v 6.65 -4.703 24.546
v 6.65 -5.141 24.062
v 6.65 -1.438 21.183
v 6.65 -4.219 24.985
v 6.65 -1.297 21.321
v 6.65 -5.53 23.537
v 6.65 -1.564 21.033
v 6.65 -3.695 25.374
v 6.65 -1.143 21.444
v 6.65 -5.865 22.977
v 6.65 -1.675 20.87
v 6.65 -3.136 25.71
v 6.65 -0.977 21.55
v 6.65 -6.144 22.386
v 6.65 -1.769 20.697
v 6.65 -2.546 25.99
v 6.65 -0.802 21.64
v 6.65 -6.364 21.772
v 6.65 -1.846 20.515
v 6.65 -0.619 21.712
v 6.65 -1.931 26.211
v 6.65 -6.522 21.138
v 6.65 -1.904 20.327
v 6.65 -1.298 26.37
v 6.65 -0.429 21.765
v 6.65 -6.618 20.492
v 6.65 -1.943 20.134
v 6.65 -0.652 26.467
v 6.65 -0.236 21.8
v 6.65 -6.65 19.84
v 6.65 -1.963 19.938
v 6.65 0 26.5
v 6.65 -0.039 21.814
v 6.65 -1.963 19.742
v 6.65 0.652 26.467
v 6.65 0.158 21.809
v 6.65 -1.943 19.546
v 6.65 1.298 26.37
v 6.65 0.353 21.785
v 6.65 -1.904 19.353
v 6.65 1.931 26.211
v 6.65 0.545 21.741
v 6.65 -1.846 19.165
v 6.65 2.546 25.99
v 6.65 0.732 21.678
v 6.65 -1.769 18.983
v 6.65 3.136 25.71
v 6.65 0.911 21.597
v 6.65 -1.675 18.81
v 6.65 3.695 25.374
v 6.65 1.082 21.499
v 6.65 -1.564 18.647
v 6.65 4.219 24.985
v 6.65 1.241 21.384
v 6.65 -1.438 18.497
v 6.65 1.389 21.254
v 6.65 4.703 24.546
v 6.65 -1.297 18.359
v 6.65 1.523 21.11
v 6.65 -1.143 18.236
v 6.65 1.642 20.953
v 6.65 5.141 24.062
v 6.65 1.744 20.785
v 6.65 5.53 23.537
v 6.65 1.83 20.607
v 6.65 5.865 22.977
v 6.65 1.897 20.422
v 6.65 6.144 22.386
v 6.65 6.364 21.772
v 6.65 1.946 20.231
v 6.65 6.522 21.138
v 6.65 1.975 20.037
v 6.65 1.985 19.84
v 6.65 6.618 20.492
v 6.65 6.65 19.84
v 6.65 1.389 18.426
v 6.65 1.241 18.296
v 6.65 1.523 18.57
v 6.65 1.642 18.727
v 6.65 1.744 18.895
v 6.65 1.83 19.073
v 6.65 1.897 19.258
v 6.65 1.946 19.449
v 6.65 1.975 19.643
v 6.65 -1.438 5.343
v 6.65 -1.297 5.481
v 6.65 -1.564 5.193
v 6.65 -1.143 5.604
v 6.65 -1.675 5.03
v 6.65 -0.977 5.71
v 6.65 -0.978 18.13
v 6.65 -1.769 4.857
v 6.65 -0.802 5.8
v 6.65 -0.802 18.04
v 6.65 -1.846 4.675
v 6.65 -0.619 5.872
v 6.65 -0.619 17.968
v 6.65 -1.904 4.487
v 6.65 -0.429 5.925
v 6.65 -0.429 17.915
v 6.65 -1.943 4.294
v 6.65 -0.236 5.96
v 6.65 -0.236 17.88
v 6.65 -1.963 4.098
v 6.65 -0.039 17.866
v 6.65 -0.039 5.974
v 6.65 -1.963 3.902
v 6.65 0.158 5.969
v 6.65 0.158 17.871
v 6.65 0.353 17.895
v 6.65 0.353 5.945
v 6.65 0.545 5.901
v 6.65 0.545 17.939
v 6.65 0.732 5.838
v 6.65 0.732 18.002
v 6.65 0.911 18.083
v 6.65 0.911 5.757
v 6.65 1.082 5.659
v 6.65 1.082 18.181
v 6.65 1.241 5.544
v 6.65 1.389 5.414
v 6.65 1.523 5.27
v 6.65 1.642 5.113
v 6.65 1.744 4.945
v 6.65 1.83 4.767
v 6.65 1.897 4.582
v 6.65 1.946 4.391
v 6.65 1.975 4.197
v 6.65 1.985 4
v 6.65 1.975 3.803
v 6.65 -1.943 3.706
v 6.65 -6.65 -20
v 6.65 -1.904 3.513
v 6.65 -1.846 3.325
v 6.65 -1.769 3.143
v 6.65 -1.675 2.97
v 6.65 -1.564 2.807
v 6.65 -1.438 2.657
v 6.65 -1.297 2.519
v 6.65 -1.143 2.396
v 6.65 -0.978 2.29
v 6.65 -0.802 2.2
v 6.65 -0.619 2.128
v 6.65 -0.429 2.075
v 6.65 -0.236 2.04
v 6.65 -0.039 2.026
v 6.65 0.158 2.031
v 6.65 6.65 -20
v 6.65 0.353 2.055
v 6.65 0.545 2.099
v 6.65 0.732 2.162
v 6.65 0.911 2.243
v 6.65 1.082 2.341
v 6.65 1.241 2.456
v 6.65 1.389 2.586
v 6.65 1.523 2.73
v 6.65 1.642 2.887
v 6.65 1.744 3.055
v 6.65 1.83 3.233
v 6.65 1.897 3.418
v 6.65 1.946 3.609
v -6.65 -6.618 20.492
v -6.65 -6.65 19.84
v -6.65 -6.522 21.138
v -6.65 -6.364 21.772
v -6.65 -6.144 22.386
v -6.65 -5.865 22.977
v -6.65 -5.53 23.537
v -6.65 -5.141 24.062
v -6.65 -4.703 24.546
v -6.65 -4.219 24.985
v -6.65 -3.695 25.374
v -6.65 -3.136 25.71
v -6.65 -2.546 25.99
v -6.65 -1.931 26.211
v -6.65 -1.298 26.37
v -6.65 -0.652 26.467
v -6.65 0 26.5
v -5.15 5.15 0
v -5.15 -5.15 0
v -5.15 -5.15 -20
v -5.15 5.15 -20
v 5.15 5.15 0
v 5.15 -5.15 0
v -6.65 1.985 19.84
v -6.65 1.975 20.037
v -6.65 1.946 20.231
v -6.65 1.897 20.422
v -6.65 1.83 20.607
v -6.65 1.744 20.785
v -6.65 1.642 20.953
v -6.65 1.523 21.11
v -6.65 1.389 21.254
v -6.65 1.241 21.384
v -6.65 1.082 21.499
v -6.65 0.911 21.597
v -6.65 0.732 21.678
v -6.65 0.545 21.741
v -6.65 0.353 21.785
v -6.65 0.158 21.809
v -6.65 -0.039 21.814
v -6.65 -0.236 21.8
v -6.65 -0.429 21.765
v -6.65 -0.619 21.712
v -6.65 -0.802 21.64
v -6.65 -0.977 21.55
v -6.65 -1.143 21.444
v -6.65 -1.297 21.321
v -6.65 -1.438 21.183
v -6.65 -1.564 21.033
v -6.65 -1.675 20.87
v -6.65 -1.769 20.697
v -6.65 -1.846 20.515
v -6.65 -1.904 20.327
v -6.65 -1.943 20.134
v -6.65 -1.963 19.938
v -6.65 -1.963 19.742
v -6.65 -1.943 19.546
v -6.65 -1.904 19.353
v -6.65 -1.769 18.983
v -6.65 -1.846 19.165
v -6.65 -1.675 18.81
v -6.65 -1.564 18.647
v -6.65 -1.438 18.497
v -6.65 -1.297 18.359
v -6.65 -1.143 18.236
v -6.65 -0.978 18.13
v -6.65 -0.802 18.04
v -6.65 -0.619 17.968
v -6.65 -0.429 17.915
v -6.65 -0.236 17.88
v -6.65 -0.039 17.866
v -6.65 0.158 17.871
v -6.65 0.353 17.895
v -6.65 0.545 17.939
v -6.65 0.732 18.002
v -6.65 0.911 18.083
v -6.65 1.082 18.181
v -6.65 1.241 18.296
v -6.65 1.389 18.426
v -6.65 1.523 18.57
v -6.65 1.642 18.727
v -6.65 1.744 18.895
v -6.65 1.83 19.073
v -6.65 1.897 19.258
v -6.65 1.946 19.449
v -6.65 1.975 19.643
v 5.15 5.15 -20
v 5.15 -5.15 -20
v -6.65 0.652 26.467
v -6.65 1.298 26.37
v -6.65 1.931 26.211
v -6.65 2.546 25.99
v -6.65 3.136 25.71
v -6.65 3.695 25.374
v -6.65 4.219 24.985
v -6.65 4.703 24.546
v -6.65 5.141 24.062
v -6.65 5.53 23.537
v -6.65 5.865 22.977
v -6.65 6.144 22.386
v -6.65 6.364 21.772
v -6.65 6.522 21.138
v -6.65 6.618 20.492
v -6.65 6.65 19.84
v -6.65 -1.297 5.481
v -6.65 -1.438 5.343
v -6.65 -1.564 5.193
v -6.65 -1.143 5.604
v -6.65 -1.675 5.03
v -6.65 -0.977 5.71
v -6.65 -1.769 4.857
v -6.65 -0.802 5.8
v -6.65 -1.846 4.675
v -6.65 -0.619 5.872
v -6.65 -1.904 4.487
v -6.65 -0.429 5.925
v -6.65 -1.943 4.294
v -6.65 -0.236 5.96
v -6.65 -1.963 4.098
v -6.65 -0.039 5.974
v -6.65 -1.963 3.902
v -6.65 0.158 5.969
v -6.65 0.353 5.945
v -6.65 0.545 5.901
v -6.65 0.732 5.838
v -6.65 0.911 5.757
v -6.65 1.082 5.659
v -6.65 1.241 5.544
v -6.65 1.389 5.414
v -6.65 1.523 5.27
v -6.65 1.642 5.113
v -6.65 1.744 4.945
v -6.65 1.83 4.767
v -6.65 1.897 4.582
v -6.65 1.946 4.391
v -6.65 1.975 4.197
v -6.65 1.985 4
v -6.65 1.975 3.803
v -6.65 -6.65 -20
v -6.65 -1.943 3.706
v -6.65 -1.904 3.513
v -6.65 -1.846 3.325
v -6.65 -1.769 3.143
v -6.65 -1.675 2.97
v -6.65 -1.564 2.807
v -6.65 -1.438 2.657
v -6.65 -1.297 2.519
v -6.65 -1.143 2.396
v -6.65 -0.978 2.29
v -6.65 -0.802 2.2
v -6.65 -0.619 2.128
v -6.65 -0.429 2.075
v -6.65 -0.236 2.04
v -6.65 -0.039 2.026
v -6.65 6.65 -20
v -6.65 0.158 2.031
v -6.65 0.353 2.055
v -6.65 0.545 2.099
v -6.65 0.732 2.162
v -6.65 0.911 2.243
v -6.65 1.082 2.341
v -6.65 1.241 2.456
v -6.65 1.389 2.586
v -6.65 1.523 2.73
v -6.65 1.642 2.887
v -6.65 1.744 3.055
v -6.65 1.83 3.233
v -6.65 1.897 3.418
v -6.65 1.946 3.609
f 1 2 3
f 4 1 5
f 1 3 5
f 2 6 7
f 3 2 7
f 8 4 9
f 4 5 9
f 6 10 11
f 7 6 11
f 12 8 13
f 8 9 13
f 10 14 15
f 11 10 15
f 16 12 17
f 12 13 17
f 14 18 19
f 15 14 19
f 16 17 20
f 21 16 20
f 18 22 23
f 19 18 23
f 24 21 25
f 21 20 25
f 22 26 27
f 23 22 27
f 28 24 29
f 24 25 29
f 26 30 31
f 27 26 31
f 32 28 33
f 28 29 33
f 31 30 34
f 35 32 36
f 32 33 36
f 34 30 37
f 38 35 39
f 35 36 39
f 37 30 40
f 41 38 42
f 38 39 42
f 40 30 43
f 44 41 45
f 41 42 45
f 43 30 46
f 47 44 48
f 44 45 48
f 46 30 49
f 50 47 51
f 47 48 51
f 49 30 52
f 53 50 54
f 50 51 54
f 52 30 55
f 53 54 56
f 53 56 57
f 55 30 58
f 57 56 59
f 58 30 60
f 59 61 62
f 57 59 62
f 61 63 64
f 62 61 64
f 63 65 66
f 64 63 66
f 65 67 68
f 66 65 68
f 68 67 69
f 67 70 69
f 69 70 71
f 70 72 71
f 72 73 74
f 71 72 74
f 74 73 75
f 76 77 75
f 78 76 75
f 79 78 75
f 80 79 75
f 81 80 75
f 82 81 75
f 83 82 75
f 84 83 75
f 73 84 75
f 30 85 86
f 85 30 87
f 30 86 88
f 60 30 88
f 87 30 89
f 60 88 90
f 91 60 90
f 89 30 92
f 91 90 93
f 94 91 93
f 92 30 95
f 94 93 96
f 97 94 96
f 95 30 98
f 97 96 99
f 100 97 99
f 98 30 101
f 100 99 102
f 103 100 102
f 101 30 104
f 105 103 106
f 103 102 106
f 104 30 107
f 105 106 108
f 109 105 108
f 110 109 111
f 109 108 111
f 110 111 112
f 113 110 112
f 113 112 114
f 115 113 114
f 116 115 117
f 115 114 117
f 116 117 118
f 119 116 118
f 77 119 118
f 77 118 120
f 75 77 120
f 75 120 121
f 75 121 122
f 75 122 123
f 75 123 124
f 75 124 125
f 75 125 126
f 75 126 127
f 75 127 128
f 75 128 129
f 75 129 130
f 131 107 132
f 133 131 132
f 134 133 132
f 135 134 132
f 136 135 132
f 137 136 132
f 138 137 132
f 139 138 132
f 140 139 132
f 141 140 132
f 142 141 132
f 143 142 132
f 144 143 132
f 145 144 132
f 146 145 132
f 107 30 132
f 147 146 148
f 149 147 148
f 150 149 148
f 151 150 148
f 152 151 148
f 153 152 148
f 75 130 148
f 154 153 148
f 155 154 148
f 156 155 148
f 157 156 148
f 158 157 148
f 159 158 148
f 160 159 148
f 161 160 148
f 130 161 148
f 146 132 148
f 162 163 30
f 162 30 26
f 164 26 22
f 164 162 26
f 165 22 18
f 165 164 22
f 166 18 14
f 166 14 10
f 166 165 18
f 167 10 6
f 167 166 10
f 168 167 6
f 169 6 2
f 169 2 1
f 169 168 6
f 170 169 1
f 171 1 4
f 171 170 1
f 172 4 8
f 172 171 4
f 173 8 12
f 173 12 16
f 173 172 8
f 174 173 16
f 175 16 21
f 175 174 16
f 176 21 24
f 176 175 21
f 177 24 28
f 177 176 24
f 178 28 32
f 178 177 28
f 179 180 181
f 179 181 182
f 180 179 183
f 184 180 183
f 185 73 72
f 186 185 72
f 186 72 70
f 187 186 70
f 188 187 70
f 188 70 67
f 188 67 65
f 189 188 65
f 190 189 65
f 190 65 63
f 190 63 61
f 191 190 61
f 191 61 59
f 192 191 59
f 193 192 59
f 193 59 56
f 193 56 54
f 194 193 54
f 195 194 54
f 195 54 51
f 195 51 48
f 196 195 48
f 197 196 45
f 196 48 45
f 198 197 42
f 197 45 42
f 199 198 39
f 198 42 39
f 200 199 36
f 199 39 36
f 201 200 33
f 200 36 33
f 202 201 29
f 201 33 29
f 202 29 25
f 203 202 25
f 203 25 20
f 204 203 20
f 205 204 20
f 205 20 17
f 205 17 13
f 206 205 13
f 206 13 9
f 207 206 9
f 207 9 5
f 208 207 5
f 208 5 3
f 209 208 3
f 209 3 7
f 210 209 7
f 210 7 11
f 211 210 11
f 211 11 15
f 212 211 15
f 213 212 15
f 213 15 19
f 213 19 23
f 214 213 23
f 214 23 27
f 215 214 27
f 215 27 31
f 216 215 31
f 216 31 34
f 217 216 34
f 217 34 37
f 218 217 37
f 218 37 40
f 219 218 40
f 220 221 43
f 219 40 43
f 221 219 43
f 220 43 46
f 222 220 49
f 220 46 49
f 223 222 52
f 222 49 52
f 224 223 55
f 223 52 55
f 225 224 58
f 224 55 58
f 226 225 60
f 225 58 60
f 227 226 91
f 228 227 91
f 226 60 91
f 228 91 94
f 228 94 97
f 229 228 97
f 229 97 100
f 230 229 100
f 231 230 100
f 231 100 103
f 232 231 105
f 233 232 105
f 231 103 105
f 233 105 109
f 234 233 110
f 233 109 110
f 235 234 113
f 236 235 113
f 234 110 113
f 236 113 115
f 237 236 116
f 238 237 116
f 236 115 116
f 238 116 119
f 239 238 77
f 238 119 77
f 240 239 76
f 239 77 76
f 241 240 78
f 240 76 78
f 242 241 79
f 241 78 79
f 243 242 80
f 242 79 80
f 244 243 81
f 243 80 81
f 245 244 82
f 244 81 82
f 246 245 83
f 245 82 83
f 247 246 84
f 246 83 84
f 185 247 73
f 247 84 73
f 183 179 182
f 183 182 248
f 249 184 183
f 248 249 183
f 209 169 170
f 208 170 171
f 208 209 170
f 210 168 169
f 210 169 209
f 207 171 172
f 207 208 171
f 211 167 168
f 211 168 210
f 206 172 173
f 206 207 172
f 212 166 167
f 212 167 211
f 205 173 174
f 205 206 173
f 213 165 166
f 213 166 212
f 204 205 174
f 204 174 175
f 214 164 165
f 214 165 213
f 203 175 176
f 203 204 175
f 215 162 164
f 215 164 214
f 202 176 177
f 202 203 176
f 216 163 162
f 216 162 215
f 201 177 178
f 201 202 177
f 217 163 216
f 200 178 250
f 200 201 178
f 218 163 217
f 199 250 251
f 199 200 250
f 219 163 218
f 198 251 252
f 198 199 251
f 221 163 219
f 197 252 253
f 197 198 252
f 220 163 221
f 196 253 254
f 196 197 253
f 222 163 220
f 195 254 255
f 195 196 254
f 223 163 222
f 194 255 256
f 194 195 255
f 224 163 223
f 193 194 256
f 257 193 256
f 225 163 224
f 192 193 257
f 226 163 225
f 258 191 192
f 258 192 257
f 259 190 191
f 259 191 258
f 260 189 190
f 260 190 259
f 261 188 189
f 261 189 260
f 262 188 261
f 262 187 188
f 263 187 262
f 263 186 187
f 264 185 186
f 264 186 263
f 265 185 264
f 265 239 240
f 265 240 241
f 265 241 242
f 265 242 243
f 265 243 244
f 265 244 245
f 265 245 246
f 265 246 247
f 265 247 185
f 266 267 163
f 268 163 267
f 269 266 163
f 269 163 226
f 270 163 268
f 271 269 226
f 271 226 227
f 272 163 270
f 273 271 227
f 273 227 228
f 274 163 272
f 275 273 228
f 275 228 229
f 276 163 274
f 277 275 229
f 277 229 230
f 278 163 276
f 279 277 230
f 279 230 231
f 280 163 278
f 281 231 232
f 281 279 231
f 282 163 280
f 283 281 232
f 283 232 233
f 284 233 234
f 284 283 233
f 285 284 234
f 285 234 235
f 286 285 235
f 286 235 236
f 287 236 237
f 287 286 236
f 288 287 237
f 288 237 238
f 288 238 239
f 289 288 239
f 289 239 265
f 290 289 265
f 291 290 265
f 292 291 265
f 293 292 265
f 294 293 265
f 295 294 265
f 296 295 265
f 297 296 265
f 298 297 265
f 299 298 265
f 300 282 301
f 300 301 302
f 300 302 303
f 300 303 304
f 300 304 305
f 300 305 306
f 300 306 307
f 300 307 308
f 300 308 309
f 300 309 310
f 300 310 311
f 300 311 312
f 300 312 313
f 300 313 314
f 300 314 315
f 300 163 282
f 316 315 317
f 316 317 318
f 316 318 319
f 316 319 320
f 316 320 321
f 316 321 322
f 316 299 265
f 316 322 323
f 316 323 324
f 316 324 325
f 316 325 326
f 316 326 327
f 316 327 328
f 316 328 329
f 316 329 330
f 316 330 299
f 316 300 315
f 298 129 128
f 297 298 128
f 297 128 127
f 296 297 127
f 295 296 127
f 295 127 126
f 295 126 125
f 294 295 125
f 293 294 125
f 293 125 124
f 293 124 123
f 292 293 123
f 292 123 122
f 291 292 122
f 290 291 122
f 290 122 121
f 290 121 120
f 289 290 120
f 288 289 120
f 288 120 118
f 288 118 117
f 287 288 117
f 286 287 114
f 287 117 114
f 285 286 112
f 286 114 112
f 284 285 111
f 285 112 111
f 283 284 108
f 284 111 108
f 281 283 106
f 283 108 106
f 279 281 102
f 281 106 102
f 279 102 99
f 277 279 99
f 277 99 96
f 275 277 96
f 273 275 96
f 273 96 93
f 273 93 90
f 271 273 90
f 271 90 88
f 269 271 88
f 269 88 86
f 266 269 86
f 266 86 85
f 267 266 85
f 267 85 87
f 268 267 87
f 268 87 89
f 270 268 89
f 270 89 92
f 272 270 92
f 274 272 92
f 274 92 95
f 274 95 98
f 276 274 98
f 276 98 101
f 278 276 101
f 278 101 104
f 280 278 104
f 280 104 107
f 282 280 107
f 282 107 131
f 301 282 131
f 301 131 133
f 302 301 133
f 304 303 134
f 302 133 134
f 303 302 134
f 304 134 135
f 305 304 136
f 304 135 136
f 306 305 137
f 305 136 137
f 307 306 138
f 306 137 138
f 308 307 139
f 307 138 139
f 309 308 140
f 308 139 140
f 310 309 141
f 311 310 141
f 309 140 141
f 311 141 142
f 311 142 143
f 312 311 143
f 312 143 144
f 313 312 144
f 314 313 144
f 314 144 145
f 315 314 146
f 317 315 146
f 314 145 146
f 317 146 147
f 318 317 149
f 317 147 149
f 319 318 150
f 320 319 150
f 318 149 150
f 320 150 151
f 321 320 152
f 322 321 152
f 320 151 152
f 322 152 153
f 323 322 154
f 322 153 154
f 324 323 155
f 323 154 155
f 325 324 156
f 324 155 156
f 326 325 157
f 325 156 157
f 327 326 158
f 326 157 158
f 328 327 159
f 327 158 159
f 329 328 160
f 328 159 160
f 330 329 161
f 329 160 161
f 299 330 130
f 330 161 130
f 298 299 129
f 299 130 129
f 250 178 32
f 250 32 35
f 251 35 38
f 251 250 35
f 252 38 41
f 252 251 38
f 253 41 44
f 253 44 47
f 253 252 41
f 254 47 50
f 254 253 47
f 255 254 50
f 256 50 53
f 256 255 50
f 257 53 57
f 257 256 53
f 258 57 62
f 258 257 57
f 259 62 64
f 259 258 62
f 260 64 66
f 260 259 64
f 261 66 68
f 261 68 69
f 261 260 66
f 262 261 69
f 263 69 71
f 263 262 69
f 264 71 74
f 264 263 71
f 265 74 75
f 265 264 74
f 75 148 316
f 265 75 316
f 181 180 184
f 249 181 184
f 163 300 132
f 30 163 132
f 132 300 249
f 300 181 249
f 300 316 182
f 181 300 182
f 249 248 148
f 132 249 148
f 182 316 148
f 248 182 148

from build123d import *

# Parameters (mm, degrees)
F0_W          = 13.3
F0_H          = 13.3
F0_W_2        = 10.3
F0_H_2        = 10.3
F1_DEPTH      = 20
F2_DEPTH      = 1.5
F3_W          = 4
F3_H          = 13.3
F3_W_2        = 5.3
F4_DEPTH      = 25
F5_T1_DEPTH   = 46.6
F6_R          = 1.975
F7_DEPTH      = 25
F7_DEPTH_BACK = 25


# Not quite as in the source:
# - a fillet or chamfer that OpenCascade refuses, or shapes differently, is made with other operations: its cross-section is extruded or revolved along the edge and cut away or added


with BuildPart() as f1:
    # F0 (on Top) → F1 (new body)
    with BuildSketch(Plane.XY):
        Rectangle(F0_W, F0_H)
        Rectangle(F0_W_2, F0_H_2, mode=Mode.SUBTRACT)
    extrude(amount=-F1_DEPTH)

    # F0 (on Top) → F2 (join)
    with BuildSketch(Plane.XY):
        Rectangle(F0_W, F0_H)
        Rectangle(F0_W_2, F0_H_2, mode=Mode.SUBTRACT)
        Rectangle(F0_W_2, F0_H_2)
    extrude(amount=F2_DEPTH)

    # F3 (on face) → F4 (join)
    with BuildSketch(Plane.XY.offset(1.5)):
        with Locations((-4.65, 0)):
            Rectangle(F3_W, F3_H)
        with Locations((4.65, 0)):
            Rectangle(F3_W, F3_H)
        Rectangle(F3_W_2, F3_H)
    extrude(amount=F4_DEPTH)

    # F5: fillet of radius 6.66 on 2 edges, made by hand

    # F5_s2 → F5_t1 (cut)
    with BuildSketch(Plane.YZ.offset(-23.3)):
        with BuildLine():
            ThreePointArc((-0.01, 26.5), (4.6993311627, 24.5493311627), (6.65, 19.84))
            Line((6.65, 19.84), (6.65, 26.5))
            Line((6.65, 26.5), (-0.01, 26.5))
        make_face()
        with BuildLine():
            ThreePointArc((-6.65, 19.84), (-4.6993311627, 24.5493311627), (0.01, 26.5))
            Line((0.01, 26.5), (-6.65, 26.5))
            Line((-6.65, 26.5), (-6.65, 19.84))
        make_face()
    extrude(amount=F5_T1_DEPTH, mode=Mode.SUBTRACT)

    # F6 (on face) → F7 (cut, two sides)
    with BuildSketch(Plane.YZ.offset(6.65)) as f7_sk:
        with Locations((0.01, 4)):
            Circle(F6_R)
        with Locations((0.01, 19.84)):
            Circle(F6_R)
    extrude(amount=-F7_DEPTH, mode=Mode.SUBTRACT)
    extrude(f7_sk.sketch, amount=F7_DEPTH_BACK, mode=Mode.SUBTRACT)


solid = f1.part
